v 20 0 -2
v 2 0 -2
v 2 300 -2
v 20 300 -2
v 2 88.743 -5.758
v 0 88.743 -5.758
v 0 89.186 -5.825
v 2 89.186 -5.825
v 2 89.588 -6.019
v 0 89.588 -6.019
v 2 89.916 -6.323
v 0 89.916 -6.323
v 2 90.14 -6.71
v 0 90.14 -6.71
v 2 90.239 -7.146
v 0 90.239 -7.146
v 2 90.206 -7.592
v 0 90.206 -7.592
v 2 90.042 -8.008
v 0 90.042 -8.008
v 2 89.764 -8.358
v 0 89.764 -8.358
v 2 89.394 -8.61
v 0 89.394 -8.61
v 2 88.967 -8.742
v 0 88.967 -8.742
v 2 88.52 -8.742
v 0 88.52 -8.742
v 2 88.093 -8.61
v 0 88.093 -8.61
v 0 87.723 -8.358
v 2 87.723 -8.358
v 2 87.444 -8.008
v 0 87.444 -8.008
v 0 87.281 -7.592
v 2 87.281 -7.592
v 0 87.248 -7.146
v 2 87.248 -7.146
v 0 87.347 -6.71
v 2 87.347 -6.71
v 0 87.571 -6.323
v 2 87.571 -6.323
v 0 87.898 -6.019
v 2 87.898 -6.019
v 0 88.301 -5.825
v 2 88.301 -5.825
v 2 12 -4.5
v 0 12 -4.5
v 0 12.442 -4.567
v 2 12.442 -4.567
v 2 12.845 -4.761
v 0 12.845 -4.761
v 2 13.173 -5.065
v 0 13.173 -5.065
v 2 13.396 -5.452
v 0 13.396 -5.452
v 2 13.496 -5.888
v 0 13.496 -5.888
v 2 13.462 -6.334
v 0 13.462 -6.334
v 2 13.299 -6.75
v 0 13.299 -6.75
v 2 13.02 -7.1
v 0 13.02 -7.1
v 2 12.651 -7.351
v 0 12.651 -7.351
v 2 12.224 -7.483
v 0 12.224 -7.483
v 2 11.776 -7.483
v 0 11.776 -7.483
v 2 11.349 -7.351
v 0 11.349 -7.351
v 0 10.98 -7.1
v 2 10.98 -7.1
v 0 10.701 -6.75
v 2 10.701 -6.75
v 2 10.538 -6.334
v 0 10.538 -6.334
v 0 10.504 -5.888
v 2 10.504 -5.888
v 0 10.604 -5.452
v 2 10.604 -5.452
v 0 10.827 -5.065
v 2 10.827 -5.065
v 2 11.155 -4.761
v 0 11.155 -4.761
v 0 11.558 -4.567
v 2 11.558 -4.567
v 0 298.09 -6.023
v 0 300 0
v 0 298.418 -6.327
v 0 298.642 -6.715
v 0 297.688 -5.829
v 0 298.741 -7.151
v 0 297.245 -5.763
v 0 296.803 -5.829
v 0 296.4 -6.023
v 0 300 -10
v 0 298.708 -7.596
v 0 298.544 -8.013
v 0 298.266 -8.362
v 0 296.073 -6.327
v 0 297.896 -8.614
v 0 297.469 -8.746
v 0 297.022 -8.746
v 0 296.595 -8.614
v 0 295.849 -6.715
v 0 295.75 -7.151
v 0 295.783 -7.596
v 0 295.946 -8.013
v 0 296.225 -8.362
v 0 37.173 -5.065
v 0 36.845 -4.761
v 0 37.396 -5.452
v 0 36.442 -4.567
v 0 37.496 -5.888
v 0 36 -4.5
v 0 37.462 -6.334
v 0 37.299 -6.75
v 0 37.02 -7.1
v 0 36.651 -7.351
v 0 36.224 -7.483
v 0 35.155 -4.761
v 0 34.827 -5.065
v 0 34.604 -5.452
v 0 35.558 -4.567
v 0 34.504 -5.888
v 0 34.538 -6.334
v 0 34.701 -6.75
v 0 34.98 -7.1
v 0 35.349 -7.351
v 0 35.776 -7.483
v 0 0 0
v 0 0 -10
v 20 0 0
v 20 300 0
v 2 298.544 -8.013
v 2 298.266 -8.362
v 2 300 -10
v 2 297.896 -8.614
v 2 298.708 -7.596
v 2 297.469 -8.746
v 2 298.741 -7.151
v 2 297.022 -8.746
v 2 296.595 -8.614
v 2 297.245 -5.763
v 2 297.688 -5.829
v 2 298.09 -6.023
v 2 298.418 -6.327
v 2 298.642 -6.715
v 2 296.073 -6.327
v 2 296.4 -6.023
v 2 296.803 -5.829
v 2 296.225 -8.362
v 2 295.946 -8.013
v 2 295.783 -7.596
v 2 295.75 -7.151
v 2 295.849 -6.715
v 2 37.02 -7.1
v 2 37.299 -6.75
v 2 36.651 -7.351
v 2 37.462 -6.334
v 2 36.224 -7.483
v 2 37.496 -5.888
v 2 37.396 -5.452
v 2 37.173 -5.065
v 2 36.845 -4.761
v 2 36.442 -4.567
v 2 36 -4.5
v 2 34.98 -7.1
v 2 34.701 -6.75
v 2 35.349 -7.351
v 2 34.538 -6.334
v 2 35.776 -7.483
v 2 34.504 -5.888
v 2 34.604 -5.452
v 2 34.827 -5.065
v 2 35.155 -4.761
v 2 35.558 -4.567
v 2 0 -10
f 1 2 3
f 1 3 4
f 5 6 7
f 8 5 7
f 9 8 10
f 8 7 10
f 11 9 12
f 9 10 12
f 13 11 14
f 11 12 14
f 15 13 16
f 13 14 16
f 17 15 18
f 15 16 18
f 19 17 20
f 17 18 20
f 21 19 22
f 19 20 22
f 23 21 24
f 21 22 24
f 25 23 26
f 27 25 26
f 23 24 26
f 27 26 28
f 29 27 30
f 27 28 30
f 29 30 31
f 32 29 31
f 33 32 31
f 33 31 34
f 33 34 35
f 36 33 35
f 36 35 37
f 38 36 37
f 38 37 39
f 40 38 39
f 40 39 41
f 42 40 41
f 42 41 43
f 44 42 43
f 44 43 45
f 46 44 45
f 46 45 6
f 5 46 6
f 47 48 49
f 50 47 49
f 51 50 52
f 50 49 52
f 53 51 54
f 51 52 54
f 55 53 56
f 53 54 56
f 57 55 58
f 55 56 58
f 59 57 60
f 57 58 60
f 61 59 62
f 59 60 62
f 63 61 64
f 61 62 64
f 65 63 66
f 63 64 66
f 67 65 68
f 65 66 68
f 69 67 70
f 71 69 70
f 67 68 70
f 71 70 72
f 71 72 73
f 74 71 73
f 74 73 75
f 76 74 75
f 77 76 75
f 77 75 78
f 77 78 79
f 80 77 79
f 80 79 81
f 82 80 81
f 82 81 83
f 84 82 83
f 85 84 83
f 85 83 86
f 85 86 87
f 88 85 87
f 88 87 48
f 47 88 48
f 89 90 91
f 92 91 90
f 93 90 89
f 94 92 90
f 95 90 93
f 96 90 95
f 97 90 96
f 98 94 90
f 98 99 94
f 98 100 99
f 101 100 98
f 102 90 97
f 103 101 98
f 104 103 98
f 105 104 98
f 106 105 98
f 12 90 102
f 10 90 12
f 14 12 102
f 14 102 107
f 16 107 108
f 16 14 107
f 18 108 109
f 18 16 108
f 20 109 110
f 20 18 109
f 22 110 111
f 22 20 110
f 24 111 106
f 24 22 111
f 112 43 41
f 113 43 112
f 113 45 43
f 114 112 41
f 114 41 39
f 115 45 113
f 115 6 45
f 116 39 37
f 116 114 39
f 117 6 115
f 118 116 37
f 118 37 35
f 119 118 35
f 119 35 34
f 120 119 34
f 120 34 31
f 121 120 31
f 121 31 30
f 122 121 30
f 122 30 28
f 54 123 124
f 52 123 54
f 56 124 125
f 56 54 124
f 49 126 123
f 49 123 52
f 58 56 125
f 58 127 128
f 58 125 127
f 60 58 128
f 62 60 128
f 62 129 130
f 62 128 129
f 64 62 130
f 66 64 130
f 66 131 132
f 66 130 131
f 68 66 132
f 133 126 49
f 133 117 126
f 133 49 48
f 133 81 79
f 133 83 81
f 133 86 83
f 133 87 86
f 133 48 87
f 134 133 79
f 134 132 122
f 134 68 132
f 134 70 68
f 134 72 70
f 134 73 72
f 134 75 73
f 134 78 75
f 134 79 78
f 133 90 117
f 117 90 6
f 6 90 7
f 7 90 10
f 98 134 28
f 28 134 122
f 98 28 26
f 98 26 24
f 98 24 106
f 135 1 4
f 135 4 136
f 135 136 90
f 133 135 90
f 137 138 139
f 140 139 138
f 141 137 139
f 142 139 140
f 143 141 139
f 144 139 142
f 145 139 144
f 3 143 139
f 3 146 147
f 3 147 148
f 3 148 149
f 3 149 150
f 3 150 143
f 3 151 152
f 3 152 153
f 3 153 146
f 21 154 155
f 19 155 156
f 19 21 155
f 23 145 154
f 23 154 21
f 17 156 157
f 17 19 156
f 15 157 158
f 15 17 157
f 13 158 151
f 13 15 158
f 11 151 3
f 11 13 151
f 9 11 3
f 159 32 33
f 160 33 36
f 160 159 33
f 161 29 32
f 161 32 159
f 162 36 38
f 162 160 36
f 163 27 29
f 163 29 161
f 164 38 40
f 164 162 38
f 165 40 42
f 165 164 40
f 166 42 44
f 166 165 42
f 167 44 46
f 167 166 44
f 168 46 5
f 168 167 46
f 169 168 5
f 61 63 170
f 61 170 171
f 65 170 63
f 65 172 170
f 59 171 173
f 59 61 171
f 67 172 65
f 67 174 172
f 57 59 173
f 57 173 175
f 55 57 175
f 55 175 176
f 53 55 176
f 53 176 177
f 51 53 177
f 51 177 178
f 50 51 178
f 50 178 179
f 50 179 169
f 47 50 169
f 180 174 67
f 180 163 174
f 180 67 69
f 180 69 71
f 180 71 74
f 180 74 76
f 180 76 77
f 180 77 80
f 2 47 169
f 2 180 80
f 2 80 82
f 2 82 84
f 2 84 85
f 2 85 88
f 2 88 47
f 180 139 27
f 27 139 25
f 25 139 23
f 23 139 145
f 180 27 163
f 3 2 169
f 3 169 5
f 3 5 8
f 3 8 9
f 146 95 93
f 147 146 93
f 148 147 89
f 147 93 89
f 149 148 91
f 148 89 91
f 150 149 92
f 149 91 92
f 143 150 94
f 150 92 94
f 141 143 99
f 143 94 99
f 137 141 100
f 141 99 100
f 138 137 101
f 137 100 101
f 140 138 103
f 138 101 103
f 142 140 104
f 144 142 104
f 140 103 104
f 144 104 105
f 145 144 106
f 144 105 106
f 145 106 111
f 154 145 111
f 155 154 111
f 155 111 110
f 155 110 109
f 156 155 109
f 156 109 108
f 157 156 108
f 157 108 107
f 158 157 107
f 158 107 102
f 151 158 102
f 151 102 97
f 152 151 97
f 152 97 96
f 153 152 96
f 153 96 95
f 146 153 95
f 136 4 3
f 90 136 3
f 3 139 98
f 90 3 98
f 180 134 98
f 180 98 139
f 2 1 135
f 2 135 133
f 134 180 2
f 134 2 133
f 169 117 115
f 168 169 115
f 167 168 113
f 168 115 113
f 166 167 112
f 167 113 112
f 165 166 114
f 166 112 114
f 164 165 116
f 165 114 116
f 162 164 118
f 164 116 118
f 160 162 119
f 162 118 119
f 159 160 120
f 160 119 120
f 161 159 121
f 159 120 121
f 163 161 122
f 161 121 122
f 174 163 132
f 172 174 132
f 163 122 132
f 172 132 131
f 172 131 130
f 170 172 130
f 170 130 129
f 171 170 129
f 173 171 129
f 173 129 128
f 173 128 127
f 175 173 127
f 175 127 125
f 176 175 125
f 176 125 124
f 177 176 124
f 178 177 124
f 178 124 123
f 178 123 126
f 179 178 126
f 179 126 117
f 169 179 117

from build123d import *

# Parameters (mm, degrees)
BOSS_EXTRUDE1_DEPTH      = 300
SKETCH2_R                = 1.5
CUT_EXTRUDE1_DEPTH       = 301.83217913
F_3_0_3_DIAMETER_HOLE1_D = 3


with BuildPart() as part:
    # Sketch1 → Boss-Extrude1 (new body)
    with BuildSketch(Plane(origin=(0, 0, 0), x_dir=(1, 0, 0), z_dir=(0, 1, 0))):
        Polygon((0, 0), (0, 10), (2, 10), (2, 2), (20, 2), (20, 0), align=None)
    extrude(amount=BOSS_EXTRUDE1_DEPTH)

    # Sketch2 → Cut-Extrude1 (cut, through all)
    with BuildSketch(Plane.ZY):
        with Locations((-7.262612197, 297.245406858)):
            Circle(SKETCH2_R)
        with Locations((-7.258467028, 88.743438507)):
            Circle(SKETCH2_R)
    extrude(amount=-CUT_EXTRUDE1_DEPTH, mode=Mode.SUBTRACT)

    # Ø3.0 (3) Diameter Hole1 (through all)
    with Locations(Plane(origin=(2, -25.407632793, 52.861996081), x_dir=(0, 0, -1), z_dir=(1, 0, 0))):
        with Locations((58.861996081, 61.407632793), (58.861996081, 37.407632793)):
            Hole(F_3_0_3_DIAMETER_HOLE1_D / 2)


solid = part.part
